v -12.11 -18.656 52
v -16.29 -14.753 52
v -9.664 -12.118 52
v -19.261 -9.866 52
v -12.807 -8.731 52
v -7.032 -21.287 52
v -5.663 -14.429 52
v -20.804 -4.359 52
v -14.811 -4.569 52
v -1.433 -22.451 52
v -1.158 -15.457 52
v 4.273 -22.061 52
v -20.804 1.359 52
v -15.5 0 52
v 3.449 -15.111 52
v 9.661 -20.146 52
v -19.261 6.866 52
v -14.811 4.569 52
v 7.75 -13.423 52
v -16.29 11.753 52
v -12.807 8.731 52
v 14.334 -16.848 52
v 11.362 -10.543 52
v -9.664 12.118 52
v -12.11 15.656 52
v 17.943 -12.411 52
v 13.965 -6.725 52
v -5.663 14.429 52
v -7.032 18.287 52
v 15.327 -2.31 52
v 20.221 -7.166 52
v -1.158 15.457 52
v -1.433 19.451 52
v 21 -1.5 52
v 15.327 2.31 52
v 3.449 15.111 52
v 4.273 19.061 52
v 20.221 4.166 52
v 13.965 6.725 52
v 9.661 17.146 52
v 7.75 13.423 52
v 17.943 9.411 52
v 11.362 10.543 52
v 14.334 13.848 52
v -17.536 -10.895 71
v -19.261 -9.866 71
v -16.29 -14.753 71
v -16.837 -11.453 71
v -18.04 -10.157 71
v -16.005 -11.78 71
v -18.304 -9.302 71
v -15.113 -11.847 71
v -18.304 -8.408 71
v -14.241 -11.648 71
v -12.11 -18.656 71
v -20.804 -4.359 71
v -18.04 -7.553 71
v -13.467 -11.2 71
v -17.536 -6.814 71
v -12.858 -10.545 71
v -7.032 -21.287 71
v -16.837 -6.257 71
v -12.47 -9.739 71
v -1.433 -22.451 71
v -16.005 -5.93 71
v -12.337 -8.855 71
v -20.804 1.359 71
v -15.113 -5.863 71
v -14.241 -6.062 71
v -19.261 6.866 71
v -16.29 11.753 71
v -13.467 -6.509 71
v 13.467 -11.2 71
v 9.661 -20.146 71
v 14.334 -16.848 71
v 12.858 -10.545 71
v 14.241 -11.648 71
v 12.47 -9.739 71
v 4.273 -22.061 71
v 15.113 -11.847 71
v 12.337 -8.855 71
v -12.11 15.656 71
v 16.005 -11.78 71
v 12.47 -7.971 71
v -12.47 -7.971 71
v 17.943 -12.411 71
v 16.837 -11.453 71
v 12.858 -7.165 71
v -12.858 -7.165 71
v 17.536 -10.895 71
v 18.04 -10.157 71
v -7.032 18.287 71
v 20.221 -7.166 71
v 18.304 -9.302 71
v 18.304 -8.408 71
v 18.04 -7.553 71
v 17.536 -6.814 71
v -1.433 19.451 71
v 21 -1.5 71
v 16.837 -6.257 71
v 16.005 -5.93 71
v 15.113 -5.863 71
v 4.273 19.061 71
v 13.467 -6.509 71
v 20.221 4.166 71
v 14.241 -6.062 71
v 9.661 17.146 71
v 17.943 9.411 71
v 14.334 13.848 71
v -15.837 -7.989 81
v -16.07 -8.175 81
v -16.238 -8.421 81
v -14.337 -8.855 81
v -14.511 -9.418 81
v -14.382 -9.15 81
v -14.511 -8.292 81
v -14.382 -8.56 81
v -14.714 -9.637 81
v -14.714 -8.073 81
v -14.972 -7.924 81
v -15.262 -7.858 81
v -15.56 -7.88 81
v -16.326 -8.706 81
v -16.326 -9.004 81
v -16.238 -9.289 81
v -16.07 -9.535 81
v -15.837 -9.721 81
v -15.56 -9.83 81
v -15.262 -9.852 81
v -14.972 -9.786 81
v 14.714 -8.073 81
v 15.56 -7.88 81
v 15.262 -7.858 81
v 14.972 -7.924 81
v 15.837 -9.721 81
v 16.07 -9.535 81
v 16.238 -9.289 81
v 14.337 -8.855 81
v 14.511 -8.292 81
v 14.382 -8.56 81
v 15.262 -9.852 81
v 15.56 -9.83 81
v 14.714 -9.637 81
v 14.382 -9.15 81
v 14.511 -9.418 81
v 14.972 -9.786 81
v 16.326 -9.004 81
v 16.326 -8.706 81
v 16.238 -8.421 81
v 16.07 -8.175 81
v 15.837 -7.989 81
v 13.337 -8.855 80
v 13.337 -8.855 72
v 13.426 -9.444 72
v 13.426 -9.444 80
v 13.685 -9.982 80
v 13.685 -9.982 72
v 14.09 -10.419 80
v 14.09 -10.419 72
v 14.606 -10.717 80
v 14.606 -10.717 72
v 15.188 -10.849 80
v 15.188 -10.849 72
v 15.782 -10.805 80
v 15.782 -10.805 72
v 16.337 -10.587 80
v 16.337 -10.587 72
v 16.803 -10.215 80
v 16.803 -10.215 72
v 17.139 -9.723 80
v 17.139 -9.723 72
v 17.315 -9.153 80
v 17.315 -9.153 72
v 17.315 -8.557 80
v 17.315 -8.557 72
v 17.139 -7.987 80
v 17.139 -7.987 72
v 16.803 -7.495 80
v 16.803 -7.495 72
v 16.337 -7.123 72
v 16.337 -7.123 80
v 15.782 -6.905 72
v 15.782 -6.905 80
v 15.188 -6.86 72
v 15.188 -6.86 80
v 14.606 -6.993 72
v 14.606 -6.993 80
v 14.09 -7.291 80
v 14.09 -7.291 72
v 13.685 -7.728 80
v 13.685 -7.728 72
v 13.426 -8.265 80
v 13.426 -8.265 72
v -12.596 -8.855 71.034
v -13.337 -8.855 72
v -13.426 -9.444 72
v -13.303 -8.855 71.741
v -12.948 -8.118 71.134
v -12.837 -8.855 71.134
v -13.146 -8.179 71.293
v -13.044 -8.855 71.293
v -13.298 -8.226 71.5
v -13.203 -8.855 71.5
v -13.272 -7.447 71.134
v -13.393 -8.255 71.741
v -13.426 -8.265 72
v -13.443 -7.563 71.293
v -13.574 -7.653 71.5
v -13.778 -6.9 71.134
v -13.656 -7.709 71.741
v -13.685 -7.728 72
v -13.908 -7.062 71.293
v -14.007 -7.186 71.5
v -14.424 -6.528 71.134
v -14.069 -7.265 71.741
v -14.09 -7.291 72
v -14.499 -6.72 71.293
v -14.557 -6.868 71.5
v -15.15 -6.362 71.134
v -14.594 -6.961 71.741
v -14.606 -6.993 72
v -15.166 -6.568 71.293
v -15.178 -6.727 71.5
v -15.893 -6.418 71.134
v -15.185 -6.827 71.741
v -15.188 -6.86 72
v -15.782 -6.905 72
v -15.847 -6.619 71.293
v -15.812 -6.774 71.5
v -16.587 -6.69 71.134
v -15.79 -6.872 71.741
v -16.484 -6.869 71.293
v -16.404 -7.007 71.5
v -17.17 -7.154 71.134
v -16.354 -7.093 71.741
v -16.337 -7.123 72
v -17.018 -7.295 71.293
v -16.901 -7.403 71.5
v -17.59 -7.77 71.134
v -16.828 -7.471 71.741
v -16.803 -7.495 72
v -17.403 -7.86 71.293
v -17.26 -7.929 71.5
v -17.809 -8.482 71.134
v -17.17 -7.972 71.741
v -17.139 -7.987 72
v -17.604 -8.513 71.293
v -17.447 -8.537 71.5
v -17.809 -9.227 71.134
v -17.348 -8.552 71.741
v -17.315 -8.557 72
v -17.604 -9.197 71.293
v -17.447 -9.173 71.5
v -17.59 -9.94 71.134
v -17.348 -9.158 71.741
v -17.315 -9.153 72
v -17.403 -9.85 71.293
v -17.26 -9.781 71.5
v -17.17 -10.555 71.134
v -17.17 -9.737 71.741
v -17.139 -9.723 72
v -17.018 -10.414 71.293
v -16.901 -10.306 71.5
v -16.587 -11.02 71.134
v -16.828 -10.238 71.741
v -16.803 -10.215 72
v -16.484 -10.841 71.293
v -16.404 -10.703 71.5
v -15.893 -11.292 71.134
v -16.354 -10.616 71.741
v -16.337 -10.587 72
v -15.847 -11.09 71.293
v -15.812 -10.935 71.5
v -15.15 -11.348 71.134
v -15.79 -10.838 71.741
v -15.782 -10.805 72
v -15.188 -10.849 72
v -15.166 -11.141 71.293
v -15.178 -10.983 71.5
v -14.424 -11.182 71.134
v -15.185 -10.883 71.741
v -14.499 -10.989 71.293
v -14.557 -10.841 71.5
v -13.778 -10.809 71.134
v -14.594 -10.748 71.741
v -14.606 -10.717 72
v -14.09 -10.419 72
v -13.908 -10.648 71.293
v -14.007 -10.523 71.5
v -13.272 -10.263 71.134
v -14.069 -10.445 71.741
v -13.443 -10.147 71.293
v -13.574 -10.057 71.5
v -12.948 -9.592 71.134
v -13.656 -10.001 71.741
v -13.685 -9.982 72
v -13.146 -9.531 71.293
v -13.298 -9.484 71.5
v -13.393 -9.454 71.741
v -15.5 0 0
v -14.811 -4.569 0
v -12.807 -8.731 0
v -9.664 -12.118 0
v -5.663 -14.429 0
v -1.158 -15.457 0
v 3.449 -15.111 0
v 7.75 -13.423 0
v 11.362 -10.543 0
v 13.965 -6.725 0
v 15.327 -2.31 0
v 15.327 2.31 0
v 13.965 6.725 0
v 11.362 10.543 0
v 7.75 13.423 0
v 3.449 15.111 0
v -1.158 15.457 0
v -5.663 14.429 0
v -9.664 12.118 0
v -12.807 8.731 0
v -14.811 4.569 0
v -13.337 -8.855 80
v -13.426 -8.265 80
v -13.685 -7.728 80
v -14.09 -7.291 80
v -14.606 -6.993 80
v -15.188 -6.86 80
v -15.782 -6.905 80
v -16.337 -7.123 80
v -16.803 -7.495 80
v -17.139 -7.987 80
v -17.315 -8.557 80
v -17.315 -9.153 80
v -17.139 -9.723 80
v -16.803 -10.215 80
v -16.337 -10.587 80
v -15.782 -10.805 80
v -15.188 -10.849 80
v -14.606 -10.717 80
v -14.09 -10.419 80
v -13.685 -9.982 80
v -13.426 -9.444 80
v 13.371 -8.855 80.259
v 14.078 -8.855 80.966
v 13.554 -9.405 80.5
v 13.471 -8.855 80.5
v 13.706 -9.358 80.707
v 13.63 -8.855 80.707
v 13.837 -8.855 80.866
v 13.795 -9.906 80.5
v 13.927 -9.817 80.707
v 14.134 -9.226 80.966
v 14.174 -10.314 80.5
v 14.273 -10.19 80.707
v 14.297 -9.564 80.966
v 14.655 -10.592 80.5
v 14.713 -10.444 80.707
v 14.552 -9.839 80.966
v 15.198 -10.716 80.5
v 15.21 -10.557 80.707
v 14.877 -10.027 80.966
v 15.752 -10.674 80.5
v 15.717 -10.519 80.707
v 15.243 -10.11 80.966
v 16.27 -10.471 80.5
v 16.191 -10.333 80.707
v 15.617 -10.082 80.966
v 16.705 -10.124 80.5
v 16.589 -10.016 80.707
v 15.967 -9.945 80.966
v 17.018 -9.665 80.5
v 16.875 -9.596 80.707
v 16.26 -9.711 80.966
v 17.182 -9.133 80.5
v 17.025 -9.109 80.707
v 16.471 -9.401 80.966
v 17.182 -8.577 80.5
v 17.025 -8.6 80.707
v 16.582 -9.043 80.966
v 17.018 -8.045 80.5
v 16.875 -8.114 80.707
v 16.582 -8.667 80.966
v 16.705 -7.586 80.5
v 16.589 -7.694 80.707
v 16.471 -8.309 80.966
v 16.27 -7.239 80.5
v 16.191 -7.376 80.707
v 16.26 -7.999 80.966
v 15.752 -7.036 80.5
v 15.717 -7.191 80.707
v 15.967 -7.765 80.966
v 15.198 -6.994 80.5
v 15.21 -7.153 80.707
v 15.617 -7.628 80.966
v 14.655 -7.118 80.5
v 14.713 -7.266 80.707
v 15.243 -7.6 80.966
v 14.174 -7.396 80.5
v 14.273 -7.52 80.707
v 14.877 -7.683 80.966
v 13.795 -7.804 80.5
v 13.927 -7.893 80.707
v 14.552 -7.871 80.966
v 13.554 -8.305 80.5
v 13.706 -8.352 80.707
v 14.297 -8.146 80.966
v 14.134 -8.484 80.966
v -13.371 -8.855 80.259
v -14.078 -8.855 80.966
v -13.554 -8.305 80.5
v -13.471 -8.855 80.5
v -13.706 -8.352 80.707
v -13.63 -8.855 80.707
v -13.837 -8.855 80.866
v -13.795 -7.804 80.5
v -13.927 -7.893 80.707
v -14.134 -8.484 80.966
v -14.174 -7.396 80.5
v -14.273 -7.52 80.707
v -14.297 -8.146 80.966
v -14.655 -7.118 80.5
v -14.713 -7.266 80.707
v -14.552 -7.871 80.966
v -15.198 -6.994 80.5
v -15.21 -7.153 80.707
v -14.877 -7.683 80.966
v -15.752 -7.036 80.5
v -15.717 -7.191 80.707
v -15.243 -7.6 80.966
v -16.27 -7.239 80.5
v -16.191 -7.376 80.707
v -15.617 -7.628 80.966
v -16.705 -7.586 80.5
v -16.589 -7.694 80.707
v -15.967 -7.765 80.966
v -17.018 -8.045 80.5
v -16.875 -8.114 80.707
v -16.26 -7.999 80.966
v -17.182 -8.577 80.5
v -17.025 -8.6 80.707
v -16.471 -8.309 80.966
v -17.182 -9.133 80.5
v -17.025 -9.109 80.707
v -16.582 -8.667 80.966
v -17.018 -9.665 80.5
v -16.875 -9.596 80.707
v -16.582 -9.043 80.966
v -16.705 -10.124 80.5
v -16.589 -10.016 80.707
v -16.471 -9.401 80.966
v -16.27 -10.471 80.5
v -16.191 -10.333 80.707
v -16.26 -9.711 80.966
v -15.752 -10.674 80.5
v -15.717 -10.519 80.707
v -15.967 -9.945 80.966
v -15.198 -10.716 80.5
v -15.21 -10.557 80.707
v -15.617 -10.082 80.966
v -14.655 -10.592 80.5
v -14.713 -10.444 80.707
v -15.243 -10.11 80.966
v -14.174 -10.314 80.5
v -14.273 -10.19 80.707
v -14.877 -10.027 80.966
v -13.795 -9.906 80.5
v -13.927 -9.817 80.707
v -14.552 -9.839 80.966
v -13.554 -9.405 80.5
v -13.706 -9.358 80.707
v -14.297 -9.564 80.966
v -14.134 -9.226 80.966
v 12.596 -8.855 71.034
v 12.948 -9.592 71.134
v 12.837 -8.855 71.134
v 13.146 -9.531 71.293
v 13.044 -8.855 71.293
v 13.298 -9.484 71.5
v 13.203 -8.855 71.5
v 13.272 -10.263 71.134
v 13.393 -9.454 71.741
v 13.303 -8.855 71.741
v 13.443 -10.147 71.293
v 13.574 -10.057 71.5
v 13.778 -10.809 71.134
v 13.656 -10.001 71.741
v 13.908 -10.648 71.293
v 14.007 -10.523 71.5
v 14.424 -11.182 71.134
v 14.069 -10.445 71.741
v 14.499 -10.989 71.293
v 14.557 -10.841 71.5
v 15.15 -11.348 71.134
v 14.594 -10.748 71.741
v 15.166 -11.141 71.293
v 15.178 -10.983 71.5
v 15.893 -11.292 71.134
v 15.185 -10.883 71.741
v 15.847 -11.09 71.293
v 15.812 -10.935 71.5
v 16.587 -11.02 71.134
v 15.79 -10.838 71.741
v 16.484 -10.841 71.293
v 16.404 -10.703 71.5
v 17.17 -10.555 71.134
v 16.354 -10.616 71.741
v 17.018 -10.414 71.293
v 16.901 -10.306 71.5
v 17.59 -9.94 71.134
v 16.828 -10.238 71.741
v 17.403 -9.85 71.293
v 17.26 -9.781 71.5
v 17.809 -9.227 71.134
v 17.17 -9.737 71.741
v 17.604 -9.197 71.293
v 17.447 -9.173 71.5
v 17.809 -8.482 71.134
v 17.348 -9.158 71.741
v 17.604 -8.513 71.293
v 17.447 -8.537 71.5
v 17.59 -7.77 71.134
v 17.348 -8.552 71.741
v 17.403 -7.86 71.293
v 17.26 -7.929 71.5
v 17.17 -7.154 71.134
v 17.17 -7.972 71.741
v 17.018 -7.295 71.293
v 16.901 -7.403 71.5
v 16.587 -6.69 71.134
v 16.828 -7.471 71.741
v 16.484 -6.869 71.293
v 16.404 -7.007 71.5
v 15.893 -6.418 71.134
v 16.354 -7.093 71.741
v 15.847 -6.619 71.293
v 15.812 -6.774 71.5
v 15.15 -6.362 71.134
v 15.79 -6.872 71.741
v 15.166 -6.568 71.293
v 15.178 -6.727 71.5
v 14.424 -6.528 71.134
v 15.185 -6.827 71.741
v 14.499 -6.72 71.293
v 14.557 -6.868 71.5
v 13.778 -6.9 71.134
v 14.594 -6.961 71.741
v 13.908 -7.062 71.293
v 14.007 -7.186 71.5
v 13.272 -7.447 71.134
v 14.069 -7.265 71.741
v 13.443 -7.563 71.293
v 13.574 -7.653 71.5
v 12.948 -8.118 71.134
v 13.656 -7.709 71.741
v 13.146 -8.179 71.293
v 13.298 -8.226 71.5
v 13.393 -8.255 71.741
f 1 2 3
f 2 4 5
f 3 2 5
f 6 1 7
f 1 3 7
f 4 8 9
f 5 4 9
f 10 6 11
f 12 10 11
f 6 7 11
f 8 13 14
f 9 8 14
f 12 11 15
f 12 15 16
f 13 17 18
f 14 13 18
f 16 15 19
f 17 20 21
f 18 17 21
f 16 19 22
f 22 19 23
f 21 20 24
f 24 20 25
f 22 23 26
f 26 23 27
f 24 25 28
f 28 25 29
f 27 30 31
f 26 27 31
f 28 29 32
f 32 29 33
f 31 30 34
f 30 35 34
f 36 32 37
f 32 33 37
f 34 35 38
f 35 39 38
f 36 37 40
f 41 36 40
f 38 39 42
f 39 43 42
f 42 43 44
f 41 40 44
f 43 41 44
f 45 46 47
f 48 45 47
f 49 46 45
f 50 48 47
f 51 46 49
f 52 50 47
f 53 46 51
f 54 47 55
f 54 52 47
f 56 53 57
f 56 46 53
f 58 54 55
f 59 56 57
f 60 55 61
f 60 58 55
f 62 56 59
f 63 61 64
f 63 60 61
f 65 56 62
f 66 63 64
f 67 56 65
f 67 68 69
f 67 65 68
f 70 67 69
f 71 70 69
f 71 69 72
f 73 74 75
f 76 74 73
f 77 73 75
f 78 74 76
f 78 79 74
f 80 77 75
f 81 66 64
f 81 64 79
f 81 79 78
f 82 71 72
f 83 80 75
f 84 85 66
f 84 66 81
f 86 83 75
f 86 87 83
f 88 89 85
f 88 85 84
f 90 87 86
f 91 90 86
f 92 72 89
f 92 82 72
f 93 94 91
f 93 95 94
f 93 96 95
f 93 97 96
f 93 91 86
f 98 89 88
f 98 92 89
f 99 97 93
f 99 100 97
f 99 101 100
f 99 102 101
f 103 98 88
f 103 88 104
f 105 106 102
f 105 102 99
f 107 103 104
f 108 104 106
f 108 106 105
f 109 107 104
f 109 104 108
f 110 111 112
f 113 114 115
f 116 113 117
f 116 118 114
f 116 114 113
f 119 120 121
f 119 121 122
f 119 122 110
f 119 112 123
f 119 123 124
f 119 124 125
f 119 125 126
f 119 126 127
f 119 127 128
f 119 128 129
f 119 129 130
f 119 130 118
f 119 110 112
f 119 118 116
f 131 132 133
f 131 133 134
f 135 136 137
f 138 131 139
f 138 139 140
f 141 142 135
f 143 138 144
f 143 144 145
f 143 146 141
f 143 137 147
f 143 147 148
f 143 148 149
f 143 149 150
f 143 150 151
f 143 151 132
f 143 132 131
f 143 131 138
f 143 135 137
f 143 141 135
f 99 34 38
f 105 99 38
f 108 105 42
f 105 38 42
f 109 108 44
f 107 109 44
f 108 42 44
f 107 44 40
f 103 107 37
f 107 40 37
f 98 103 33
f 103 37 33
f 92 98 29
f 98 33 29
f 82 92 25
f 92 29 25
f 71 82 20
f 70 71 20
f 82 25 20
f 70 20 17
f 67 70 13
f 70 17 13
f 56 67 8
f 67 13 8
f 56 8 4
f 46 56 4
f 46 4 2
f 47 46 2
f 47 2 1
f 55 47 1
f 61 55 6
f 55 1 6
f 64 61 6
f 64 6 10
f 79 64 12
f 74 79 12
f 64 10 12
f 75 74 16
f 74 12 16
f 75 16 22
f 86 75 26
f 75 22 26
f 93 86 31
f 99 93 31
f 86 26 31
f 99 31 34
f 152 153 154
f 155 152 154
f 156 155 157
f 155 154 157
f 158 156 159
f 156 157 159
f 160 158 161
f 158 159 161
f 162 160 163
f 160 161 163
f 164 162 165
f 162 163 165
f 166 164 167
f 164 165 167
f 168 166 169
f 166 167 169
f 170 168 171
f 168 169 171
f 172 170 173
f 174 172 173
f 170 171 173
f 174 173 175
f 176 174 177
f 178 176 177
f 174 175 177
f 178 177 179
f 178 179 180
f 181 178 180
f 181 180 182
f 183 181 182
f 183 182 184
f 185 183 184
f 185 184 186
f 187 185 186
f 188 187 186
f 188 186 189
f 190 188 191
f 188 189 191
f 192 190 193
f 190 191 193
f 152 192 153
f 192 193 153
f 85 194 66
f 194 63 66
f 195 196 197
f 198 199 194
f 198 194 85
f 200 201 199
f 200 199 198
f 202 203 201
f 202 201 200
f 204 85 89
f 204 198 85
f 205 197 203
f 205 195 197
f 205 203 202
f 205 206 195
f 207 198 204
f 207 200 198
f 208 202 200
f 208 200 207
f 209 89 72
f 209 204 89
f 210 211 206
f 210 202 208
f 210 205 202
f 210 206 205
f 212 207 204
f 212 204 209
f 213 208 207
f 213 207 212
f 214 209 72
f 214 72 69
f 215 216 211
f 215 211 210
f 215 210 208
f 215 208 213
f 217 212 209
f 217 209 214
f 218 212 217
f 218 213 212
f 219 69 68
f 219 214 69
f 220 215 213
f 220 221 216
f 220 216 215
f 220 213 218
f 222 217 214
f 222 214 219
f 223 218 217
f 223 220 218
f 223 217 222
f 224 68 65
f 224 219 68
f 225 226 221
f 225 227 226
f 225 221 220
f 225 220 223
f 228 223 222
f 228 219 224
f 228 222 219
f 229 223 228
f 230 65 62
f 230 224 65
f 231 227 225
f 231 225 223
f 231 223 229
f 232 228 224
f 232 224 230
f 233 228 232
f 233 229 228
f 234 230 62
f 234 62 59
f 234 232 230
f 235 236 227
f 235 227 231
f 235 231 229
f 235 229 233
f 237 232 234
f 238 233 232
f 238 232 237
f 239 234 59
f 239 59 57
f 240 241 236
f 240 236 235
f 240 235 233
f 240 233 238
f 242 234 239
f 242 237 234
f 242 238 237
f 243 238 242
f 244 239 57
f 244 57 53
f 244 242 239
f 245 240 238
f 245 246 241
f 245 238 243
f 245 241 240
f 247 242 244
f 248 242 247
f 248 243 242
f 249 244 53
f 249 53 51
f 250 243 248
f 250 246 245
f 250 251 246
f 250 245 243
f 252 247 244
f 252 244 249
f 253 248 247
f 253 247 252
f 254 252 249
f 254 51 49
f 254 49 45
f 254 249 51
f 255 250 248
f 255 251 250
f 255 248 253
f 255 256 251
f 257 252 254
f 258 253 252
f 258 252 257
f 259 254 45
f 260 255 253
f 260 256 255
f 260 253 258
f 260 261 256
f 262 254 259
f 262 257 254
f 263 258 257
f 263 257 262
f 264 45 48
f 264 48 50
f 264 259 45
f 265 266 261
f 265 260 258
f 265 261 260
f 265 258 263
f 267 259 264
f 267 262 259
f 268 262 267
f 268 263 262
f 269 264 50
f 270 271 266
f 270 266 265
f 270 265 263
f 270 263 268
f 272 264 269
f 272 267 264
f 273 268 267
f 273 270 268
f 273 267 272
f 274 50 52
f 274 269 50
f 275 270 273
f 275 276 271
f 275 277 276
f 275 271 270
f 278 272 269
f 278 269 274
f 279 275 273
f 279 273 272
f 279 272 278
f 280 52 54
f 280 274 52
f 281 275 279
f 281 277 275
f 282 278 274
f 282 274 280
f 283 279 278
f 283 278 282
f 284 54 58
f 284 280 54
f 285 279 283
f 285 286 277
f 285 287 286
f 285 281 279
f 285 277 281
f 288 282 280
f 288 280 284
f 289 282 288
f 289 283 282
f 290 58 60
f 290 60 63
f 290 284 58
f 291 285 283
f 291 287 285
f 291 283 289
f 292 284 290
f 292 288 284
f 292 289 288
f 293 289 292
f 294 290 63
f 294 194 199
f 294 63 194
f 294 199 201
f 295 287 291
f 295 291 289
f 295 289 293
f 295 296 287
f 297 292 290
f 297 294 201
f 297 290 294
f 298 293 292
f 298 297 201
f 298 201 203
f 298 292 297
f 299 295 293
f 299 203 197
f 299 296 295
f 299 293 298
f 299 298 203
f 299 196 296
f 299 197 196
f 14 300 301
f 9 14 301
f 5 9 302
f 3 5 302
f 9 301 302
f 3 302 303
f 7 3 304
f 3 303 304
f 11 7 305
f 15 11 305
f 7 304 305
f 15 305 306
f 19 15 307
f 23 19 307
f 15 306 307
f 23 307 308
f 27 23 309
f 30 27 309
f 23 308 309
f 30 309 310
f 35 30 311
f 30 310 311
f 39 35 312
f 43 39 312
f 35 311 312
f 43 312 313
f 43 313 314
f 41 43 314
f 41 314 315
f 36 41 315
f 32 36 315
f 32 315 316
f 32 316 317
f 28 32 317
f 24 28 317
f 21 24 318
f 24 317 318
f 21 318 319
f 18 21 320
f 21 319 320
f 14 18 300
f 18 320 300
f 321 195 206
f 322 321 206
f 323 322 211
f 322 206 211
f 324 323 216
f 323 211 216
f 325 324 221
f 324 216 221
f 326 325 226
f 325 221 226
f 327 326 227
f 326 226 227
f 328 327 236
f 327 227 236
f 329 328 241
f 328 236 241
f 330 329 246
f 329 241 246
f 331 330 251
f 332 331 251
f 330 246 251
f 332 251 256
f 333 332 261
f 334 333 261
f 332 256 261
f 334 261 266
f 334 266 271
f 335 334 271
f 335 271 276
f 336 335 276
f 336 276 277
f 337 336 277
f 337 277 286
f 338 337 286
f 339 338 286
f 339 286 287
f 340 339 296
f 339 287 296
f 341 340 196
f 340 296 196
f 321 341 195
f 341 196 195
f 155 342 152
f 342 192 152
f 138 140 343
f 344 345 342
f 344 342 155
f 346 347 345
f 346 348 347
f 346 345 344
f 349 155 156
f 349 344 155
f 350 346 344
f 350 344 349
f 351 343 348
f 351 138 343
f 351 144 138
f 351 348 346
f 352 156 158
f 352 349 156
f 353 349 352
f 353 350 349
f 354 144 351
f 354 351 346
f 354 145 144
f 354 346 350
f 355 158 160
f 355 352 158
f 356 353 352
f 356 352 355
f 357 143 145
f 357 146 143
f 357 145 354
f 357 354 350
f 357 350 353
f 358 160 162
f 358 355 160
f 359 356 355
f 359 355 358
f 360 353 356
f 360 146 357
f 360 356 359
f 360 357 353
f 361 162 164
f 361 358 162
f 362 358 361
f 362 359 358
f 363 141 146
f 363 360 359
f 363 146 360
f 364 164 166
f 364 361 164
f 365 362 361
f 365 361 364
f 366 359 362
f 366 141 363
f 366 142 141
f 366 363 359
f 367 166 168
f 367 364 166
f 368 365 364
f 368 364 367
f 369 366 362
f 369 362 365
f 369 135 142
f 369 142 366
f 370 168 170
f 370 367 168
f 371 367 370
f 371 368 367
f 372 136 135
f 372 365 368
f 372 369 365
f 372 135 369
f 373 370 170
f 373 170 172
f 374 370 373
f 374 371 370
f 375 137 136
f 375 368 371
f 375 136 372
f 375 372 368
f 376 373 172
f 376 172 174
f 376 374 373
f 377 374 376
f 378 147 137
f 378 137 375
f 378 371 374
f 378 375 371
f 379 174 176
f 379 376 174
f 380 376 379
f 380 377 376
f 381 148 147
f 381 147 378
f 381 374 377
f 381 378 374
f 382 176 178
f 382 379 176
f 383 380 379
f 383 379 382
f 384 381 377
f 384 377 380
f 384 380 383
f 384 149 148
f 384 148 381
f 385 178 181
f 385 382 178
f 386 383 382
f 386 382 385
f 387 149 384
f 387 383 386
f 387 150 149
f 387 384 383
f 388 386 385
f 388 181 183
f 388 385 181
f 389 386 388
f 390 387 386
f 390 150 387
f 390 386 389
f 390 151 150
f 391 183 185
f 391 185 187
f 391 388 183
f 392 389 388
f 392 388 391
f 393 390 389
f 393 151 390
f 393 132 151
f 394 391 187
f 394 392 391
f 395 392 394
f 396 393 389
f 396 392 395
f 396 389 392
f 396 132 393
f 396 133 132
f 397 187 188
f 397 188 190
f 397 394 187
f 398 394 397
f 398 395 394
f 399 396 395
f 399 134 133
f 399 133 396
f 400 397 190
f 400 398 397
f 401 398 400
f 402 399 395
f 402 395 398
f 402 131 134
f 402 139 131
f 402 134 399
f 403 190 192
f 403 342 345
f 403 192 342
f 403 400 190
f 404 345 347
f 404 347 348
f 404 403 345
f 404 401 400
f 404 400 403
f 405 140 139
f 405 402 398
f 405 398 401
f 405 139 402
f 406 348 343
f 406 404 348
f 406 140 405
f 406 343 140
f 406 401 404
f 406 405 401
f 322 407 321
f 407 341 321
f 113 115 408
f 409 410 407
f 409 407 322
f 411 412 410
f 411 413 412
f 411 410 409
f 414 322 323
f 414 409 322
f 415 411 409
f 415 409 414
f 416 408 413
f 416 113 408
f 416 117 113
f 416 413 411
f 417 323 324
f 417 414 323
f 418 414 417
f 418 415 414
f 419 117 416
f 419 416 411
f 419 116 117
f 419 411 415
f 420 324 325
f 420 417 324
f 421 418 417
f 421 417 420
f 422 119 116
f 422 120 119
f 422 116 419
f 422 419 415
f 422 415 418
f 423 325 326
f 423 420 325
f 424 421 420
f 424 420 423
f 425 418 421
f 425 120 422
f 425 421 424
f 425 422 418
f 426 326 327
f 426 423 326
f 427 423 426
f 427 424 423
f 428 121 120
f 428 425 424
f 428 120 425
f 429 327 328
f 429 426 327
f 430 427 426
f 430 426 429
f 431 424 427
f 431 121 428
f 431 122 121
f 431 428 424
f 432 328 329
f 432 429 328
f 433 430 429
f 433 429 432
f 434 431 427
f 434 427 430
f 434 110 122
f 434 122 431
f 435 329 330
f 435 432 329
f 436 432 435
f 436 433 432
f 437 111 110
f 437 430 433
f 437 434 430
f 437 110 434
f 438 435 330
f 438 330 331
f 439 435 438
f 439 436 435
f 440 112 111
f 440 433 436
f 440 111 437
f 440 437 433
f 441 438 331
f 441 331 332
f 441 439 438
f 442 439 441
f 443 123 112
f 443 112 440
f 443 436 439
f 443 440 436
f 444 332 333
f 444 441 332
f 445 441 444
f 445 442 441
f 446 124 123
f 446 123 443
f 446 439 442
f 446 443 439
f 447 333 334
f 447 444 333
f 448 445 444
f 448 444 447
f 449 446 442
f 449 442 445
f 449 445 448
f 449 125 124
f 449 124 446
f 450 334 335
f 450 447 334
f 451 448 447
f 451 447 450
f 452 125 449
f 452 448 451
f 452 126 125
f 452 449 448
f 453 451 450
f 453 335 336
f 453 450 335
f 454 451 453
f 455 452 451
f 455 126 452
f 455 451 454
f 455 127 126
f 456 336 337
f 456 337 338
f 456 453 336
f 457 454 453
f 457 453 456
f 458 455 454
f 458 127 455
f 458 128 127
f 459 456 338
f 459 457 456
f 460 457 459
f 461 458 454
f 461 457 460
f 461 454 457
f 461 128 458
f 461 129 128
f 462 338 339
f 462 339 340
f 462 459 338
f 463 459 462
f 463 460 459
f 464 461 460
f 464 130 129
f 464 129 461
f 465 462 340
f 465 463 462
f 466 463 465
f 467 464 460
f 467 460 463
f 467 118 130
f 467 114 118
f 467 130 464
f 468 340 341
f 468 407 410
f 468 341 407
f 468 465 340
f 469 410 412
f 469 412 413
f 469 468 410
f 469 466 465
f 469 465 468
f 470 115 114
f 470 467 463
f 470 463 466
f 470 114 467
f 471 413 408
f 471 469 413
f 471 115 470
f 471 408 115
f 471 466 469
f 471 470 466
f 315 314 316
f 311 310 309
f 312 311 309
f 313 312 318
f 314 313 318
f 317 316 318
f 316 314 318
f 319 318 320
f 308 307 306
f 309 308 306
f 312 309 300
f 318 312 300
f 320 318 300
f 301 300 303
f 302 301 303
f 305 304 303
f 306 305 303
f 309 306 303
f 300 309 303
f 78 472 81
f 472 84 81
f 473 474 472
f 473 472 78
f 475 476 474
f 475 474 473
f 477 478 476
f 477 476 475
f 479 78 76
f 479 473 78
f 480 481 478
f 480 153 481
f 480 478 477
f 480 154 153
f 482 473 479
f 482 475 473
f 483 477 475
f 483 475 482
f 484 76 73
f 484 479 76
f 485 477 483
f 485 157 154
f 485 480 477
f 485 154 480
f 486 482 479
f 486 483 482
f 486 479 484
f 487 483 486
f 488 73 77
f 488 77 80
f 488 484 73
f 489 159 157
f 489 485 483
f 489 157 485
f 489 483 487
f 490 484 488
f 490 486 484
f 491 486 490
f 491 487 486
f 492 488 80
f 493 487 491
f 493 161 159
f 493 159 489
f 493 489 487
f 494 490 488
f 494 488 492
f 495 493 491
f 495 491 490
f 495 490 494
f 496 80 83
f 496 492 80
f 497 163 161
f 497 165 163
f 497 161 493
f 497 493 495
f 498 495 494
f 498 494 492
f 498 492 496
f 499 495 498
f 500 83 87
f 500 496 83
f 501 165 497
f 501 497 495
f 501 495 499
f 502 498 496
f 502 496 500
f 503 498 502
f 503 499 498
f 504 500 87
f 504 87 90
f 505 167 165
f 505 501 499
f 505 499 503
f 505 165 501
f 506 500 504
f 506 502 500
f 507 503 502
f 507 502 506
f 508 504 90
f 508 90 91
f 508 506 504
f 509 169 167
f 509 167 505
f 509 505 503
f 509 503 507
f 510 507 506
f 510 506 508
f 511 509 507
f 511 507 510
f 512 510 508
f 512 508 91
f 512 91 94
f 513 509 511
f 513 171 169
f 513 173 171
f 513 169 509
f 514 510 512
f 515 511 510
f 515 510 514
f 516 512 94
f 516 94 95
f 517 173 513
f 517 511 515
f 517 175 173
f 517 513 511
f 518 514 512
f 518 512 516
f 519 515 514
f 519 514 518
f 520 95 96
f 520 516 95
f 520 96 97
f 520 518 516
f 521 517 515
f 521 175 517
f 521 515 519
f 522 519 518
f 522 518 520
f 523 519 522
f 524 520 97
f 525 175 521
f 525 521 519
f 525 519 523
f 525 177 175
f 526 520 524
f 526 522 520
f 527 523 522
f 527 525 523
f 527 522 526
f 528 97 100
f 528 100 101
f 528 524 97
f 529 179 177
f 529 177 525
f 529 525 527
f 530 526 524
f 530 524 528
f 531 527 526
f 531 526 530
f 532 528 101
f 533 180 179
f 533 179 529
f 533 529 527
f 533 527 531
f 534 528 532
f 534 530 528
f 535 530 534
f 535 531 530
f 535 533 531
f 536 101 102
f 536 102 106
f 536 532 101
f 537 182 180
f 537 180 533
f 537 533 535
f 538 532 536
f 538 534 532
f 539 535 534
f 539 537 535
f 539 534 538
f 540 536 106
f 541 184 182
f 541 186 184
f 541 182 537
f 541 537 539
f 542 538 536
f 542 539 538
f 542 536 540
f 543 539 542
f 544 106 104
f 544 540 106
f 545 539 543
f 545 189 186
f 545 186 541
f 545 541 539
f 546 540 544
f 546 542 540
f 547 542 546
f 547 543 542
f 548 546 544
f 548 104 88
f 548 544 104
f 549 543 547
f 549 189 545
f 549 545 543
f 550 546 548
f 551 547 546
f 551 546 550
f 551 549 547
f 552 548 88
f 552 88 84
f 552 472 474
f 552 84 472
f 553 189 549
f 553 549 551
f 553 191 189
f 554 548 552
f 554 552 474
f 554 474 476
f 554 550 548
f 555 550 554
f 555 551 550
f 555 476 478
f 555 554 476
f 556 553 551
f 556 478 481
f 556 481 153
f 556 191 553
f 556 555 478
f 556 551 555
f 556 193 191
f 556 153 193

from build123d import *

# Parameters (mm, degrees)
SKETCH1_R           = 15.5
BOSS_EXTRUDE1_DEPTH = 52
SKETCH2_R           = 21
BOSS_EXTRUDE2_DEPTH = 19
SKETCH3_R           = 2
BOSS_EXTRUDE3_DEPTH = 10
FILLET1_R           = 1


with BuildPart() as part:
    # Sketch1 → Boss-Extrude1 (new body)
    with BuildSketch(Plane.XY):
        with Locations(Location((0, 0, 0), (0, 0, 180))):
            Circle(SKETCH1_R)
    extrude(amount=BOSS_EXTRUDE1_DEPTH)

    # Sketch2 → Boss-Extrude2 (add)
    with BuildSketch(Plane.XY.offset(52)):
        with Locations((0, -1.5)):
            Circle(SKETCH2_R)
    extrude(amount=BOSS_EXTRUDE2_DEPTH)

    # Sketch3 → Boss-Extrude3 (add)
    with BuildSketch(Plane.XY.offset(71)):
        with Locations((-15.337121903, -8.854891459)):
            Circle(SKETCH3_R)
        with Locations(Location((15.337121903, -8.854891459, 0), (0, 0, 180))):
            Circle(SKETCH3_R)
    extrude(amount=BOSS_EXTRUDE3_DEPTH)

    # Fillet1
    fillet1_edges = [part.edges().sort_by_distance(p)[0] for p in [
        (-17.337121903, -8.854891459, 71),
        (-17.337121903, -8.854891459, 81),
        (17.337121903, -8.854891459, 71),
        (17.337121903, -8.854891459, 81),
    ]]
    fillet(fillet1_edges, radius=FILLET1_R)


solid = part.part
